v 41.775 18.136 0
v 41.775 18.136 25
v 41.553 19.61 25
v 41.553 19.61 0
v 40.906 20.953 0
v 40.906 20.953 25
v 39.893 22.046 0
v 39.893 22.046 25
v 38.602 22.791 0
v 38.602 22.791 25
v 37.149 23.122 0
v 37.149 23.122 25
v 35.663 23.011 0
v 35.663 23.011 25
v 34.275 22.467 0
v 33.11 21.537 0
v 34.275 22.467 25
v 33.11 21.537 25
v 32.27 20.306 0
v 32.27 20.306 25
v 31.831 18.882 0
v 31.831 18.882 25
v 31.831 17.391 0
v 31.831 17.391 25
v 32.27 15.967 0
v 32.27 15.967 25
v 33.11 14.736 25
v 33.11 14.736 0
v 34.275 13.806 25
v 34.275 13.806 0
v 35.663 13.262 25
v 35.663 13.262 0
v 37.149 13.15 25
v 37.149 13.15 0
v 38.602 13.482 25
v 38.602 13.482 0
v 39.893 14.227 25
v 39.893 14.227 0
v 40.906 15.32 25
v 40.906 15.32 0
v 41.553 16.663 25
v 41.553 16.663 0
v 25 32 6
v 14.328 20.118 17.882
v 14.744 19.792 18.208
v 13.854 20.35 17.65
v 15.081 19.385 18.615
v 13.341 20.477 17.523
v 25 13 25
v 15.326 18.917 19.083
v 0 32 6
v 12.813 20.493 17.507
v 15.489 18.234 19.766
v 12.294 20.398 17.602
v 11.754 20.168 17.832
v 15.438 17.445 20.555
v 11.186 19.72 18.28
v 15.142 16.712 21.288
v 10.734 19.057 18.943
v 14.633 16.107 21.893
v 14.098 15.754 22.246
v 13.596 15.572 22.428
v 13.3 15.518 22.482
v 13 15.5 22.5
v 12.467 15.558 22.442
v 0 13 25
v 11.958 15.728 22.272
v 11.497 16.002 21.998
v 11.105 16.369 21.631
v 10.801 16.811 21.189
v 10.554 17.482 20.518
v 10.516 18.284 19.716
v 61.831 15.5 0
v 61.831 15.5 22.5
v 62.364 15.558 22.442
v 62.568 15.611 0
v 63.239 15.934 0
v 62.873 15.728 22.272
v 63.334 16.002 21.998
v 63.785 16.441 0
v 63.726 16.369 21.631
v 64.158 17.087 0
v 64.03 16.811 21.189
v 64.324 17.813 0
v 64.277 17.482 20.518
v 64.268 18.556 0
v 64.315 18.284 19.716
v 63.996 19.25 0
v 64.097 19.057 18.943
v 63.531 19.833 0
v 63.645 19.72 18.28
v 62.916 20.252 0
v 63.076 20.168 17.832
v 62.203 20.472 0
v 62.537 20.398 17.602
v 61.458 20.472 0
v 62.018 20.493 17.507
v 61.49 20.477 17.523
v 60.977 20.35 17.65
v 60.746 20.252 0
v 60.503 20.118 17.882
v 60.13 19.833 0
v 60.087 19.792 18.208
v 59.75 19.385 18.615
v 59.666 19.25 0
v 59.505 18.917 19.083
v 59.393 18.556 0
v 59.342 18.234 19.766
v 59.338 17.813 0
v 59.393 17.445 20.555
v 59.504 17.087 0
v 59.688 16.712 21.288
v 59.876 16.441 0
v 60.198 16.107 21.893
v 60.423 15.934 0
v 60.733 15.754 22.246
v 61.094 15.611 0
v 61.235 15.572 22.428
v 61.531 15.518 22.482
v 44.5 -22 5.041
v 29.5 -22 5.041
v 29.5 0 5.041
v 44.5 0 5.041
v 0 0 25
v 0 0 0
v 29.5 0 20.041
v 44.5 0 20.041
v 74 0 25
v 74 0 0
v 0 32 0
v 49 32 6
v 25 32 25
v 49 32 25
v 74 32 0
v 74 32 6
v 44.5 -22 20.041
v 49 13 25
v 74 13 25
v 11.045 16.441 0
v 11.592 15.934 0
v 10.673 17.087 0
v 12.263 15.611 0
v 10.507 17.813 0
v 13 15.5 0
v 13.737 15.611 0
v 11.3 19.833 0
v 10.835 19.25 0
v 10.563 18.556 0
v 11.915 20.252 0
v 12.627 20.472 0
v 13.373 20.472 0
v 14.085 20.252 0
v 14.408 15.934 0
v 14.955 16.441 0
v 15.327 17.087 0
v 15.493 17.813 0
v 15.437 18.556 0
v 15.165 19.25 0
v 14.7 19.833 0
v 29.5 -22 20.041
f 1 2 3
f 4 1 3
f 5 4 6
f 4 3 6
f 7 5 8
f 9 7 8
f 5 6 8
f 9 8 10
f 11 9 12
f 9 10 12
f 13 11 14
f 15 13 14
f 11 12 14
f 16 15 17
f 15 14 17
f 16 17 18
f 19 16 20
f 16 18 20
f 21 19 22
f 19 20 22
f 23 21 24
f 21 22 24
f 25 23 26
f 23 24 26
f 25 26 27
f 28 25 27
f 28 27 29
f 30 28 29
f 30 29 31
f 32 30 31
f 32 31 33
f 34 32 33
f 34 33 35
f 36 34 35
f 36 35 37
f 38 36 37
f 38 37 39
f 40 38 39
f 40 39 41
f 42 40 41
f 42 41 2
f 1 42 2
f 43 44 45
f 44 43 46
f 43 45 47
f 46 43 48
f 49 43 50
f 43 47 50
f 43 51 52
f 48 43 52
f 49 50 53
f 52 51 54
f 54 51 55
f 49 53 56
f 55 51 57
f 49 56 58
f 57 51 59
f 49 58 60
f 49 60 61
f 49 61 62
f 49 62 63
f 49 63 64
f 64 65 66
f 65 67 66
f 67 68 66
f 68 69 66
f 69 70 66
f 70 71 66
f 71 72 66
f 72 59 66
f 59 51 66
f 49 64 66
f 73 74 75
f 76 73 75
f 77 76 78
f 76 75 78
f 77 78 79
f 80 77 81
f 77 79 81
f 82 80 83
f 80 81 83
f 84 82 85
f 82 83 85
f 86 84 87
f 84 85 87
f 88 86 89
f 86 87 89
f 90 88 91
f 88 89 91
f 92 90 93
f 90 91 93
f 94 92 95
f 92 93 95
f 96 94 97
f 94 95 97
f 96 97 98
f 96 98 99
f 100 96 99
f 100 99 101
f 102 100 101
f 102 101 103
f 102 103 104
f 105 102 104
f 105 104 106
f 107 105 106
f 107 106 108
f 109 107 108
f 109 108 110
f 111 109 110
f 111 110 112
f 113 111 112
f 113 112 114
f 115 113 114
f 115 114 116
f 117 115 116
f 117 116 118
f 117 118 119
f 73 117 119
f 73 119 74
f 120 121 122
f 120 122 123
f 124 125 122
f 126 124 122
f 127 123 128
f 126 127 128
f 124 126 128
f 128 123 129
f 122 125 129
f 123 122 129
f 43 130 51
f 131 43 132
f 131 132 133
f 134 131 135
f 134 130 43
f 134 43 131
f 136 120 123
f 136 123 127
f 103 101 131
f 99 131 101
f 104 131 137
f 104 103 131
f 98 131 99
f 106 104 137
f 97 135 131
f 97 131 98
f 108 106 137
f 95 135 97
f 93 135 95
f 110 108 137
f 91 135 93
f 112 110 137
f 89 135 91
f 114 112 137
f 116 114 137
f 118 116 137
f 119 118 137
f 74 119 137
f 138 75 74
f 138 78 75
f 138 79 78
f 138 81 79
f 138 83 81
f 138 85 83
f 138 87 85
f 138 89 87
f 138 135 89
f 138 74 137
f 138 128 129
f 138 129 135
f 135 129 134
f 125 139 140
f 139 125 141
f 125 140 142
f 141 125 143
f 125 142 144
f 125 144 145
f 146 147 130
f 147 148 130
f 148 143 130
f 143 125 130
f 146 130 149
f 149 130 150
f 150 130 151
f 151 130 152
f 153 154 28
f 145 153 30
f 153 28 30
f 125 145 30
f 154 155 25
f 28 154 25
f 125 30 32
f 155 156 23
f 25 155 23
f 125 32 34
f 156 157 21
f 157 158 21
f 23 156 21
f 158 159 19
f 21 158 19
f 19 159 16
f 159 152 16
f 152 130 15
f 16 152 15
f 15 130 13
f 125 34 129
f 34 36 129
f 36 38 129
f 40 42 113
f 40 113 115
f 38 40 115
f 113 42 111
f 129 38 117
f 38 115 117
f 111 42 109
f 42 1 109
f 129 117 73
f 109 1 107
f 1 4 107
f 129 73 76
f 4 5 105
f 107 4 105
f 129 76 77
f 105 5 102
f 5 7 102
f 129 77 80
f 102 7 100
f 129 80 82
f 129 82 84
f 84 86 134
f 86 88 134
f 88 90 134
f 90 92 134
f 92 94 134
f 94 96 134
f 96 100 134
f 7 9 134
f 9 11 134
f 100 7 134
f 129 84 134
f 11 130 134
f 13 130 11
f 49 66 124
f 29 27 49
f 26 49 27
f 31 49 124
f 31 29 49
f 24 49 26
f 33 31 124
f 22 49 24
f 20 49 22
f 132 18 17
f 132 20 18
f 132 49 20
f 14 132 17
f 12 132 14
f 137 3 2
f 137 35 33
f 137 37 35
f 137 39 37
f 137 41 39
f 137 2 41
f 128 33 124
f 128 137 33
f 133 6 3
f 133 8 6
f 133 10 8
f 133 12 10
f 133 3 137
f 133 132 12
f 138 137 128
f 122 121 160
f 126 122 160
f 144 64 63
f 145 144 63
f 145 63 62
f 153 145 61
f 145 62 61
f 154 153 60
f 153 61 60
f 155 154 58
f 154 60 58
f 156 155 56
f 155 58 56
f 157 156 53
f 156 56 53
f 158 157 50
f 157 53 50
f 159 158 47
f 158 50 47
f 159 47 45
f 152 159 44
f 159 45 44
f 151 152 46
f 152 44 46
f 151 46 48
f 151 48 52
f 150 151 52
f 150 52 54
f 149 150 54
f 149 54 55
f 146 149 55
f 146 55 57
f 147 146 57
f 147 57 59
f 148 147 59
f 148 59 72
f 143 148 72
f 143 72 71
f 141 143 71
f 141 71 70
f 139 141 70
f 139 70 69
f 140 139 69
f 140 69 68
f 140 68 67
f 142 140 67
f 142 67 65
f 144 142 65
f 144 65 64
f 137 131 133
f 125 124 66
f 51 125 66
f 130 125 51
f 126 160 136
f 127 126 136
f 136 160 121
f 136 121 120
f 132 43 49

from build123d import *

# Parameters (mm, degrees)
SKETCH2_W           = 74
SKETCH2_H           = 32
BOSS_EXTRUDE1_DEPTH = 25
CUT_EXTRUDE2_DEPTH  = 25
CUT_EXTRUDE3_DEPTH  = 25
SKETCH6_R           = 5
SKETCH6_R_2         = 2.5
CUT_EXTRUDE4_DEPTH  = 33
SKETCH7_W           = 15
SKETCH7_H           = 15
BOSS_EXTRUDE2_DEPTH = 22


with BuildPart() as part:
    # Sketch2 → Boss-Extrude1 (new body)
    with BuildSketch(Plane.XY):
        with Locations((37, 16)):
            Rectangle(SKETCH2_W, SKETCH2_H)
    extrude(amount=BOSS_EXTRUDE1_DEPTH)

    # Sketch4 → Cut-Extrude2 (cut)
    with BuildSketch(Plane.ZY):
        Polygon((25, 32), (6, 32), (25, 13), align=None)
    extrude(amount=-CUT_EXTRUDE2_DEPTH, mode=Mode.SUBTRACT)

    # Sketch5 → Cut-Extrude3 (cut)
    with BuildSketch(Plane(origin=(74, 0, 0), x_dir=(0, 0, -1), z_dir=(1, 0, 0))):
        Polygon((-25, 32), (-6, 32), (-25, 13), align=None)
    extrude(amount=-CUT_EXTRUDE3_DEPTH, mode=Mode.SUBTRACT)

    # Sketch6 → Cut-Extrude4 (cut)
    with BuildSketch(Plane.XY.offset(25)):
        with Locations((36.775112994, 18.136426558)):
            Circle(SKETCH6_R)
        with Locations(Location((13, 18, 0), (0, 0, 270))):
            Circle(SKETCH6_R_2)
        with Locations(Location((61.830812036, 18, 0), (0, 0, 270))):
            Circle(SKETCH6_R_2)
    extrude(amount=-CUT_EXTRUDE4_DEPTH, mode=Mode.SUBTRACT)

    # Sketch7 → Boss-Extrude2 (add)
    with BuildSketch(Plane.XZ):
        with Locations((37, 12.541396218)):
            Rectangle(SKETCH7_W, SKETCH7_H)
    extrude(amount=BOSS_EXTRUDE2_DEPTH)


solid = part.part
